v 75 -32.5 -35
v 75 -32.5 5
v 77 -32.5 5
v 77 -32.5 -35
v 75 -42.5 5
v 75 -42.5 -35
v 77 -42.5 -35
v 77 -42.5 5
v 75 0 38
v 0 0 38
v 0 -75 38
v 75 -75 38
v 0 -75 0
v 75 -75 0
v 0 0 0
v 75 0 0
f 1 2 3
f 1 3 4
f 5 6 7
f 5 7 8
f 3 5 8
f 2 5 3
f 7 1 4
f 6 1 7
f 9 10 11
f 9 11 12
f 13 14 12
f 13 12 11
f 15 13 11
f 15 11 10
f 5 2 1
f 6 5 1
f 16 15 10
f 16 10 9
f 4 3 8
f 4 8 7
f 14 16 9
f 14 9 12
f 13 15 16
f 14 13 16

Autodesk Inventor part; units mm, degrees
ref_plane "YZ Plane" through (0, 0, 0) normal (1, 0, 0) x (0, 1, 0)
ref_plane "XZ Plane" through (0, 0, 0) normal (0, 1, 0) x (-1, 0, 0)
ref_plane "XY Plane" through (0, 0, 0) normal (0, 0, 1) x (1, 0, 0)
sketch "Sketch1" plane through (0, 0, 0) normal (0, 0, 1) x (1, 0, 0)
  line L0 (0, 0) -> (75, 0)
  line L1 (75, 0) -> (75, -75)
  line L2 (75, -75) -> (0, -75)
  line L3 (0, -75) -> (0, 0)
  dimension "d0" = 75
  dimension "d1" = 75
extrude "Extrusion1" add sketch "Sketch1" along normal blind 38
sketch "Sketch2" plane through (75, -75, 0) normal (1, 0, 0) x (0, 0, -1)
  line L0 (0, 75) -> (0, 0) projected
  line L1 (0, 75) -> (-38, 75) projected
  line L2 (0, 0) -> (-38, 0) projected
  line L3 (35, 32.5) -> (-5, 32.5)
  line L4 (-5, 32.5) -> (-5, 42.5)
  line L5 (-5, 42.5) -> (35, 42.5)
  line L6 (35, 42.5) -> (35, 32.5)
  dimension "d4" = 40
  dimension "d5" = 10
  dimension "d6" = 5
  dimension "d7" = 32.5
  dimension "d8" = 32.5
extrude "Extrusion2" add sketch "Sketch2" along normal blind 2 separate body
ref_plane "Work Plane1" through (38.5, -75, 0) normal (1, 0, 0) x (0, 0, -1)
ref_plane "Work Plane2" through (0, -37.5, 0) normal (0, -1, 0) x (1, 0, 0)
ref_plane "Work Plane3" through (0, 0, 1.5) normal (0, 0, 1) x (1, 0, 0)
equation "\"d7\" = d8"
properties part number "Assembly Mount Mount"
